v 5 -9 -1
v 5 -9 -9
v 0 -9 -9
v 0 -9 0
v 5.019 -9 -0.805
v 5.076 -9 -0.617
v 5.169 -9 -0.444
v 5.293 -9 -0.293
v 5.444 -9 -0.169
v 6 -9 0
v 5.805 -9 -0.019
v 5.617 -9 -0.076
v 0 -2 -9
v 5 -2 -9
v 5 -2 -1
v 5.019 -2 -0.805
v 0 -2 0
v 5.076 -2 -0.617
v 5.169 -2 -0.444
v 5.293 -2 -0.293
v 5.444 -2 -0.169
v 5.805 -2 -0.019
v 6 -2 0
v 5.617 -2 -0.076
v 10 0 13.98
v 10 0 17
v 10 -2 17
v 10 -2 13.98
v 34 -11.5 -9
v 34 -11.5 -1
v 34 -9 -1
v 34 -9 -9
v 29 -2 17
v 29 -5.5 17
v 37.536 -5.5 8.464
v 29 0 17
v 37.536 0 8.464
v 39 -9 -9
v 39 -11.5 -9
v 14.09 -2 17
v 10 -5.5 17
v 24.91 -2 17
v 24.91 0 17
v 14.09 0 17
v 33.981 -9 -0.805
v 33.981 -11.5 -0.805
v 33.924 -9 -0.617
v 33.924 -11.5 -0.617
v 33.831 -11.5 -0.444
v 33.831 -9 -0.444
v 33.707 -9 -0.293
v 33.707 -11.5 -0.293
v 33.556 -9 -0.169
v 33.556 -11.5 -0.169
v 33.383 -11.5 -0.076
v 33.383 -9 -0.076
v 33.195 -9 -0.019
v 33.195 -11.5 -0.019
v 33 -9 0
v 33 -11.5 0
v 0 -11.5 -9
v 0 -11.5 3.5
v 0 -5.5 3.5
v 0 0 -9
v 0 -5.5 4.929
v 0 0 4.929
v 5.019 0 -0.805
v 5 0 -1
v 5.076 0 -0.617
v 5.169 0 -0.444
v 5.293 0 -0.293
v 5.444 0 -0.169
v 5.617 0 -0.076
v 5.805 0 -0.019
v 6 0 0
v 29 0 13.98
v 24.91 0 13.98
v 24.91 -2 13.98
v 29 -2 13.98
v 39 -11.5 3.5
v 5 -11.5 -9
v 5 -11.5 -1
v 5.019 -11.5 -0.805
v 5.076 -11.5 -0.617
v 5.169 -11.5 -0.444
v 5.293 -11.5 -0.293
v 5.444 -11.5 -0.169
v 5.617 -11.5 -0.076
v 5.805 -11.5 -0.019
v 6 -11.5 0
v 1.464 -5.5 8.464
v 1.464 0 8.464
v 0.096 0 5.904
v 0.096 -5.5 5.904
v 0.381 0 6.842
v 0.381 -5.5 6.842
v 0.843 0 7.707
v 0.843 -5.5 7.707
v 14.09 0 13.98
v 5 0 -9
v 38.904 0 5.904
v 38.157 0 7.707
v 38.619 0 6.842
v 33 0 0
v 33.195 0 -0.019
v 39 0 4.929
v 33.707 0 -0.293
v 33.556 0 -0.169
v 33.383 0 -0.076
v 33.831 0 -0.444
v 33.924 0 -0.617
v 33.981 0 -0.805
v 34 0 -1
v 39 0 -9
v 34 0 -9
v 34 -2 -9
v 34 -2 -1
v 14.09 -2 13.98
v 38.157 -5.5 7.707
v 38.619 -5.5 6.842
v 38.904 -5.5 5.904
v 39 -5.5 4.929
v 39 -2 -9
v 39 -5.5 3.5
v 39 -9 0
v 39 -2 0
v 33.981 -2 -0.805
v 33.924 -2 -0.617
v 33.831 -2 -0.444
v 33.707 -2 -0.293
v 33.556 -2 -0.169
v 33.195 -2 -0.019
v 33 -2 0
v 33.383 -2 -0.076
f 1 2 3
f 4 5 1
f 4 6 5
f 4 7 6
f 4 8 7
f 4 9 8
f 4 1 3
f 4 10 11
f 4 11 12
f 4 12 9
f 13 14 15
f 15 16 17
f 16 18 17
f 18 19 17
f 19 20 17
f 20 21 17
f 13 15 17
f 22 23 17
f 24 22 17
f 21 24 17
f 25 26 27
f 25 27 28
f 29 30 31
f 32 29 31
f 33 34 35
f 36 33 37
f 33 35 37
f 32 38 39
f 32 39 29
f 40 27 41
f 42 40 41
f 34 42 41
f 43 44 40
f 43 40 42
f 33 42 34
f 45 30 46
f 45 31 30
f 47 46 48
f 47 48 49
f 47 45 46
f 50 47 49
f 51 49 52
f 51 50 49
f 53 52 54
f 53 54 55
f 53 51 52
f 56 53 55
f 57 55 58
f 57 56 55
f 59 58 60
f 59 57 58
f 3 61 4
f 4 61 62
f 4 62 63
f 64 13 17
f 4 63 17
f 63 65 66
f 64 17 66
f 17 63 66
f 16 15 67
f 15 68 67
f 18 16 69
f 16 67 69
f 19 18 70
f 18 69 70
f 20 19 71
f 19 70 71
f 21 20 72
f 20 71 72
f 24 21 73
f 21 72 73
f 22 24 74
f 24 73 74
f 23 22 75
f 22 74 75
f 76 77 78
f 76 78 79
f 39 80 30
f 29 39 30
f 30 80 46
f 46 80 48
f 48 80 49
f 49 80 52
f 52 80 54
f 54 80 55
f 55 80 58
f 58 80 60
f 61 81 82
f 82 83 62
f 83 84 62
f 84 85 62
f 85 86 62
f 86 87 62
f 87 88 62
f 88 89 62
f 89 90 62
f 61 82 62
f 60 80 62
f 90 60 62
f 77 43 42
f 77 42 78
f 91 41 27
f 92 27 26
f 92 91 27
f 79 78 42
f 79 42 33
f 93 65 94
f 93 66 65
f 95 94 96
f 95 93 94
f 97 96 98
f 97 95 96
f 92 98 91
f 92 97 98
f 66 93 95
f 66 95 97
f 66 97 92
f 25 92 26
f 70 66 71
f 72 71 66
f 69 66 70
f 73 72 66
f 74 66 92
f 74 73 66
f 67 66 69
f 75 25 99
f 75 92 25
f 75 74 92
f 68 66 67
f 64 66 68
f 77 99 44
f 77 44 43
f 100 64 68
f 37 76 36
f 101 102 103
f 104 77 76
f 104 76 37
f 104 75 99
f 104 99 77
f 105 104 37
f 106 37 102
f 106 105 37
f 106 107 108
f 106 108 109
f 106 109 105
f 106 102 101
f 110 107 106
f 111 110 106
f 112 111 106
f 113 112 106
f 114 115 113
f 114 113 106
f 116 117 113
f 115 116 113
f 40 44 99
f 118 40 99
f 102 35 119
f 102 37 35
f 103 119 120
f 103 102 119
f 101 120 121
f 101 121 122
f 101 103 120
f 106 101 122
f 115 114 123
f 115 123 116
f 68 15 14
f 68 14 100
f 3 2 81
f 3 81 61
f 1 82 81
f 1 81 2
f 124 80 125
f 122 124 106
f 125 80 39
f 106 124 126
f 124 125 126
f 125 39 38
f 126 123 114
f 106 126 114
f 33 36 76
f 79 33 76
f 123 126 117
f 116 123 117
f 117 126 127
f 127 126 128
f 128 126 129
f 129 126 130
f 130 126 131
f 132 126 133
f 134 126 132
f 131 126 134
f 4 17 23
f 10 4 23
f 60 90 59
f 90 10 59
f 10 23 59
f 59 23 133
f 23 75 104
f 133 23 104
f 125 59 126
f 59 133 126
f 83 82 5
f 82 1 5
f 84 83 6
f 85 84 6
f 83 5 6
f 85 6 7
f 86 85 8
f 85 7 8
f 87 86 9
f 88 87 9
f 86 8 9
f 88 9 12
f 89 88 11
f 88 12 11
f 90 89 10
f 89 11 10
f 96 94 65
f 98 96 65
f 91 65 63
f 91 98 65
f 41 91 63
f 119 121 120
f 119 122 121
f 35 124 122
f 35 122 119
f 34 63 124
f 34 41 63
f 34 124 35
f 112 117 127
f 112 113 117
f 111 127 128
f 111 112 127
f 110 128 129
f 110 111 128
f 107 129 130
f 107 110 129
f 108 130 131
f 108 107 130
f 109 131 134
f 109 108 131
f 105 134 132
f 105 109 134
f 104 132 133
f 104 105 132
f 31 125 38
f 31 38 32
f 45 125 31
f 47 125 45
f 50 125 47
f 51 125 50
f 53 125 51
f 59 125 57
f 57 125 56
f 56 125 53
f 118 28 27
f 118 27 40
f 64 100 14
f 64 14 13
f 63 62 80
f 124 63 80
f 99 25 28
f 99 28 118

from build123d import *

# Parameters (mm, degrees)
SKETCH1_W           = 39
SKETCH1_H           = 11.5
BOSS_EXTRUDE1_DEPTH = 17
SKETCH2_W           = 5
SKETCH2_H           = 2.5
SKETCH2_H_2         = 2
BOSS_EXTRUDE2_DEPTH = 9
FILLET3_R           = 1
FILLET4_R           = 1
FILLET5_R           = 1
FILLET6_R           = 1
CHAMFER1_SIZE       = 10
CHAMFER2_SIZE       = 10
SKETCH4_W           = 4.09
SKETCH4_H           = 3.02
CUT_EXTRUDE1_DEPTH  = 2
SKETCH5_W           = 45.21307777
SKETCH5_H           = 21.662699148
CUT_EXTRUDE2_DEPTH  = 6
FILLET7_R           = 5
FILLET8_R           = 5


with BuildPart() as part:
    # Sketch1 → Boss-Extrude1 (new body)
    with BuildSketch(Plane.XY):
        with Locations((19.5, -5.75)):
            Rectangle(SKETCH1_W, SKETCH1_H)
    extrude(amount=BOSS_EXTRUDE1_DEPTH)

    # Sketch2 → Boss-Extrude2 (add)
    with BuildSketch(Plane(origin=(0, 0, 0), x_dir=(-1, 0, 0), z_dir=(0, 0, -1))):
        with Locations((-2.5, -10.25)):
            Rectangle(SKETCH2_W, SKETCH2_H)
        with Locations((-2.5, -1)):
            Rectangle(SKETCH2_W, SKETCH2_H_2)
        with Locations((-36.5, -10.25)):
            Rectangle(SKETCH2_W, SKETCH2_H)
        with Locations((-36.5, -1)):
            Rectangle(SKETCH2_W, SKETCH2_H_2)
    extrude(amount=BOSS_EXTRUDE2_DEPTH)

    # Fillet3
    fillet3_edges = [part.edges().sort_by_distance(p)[0] for p in [
        (34, -1, 0),
    ]]
    fillet(fillet3_edges, radius=FILLET3_R)

    # Fillet4
    fillet4_edges = [part.edges().sort_by_distance(p)[0] for p in [
        (5, -1, 0),
    ]]
    fillet(fillet4_edges, radius=FILLET4_R)

    # Fillet5
    fillet5_edges = [part.edges().sort_by_distance(p)[0] for p in [
        (34, -10.25, 0),
    ]]
    fillet(fillet5_edges, radius=FILLET5_R)

    # Fillet6
    fillet6_edges = [part.edges().sort_by_distance(p)[0] for p in [
        (5, -10.25, 0),
    ]]
    fillet(fillet6_edges, radius=FILLET6_R)

    # Chamfer1
    chamfer1_edges = [part.edges().sort_by_distance(p)[0] for p in [
        (39, -5.75, 17),
    ]]
    chamfer(chamfer1_edges, length=CHAMFER1_SIZE)

    # Chamfer2
    chamfer2_edges = [part.edges().sort_by_distance(p)[0] for p in [
        (0, -5.75, 17),
    ]]
    chamfer(chamfer2_edges, length=CHAMFER2_SIZE)

    # Sketch4 → Cut-Extrude1 (cut)
    with BuildSketch(Plane(origin=(0, 0, 0), x_dir=(1, 0, 0), z_dir=(0, 1, 0))):
        with Locations((26.955, -15.49)):
            Rectangle(SKETCH4_W, SKETCH4_H)
        with Locations((12.045, -15.49)):
            Rectangle(SKETCH4_W, SKETCH4_H)
    extrude(amount=-CUT_EXTRUDE1_DEPTH, mode=Mode.SUBTRACT)

    # Sketch5 → Cut-Extrude2 (cut)
    with BuildSketch(Plane.XZ.offset(11.5)):
        with Locations((22.606538885, 14.331349574)):
            Rectangle(SKETCH5_W, SKETCH5_H)
    extrude(amount=-CUT_EXTRUDE2_DEPTH, mode=Mode.SUBTRACT)

    # Fillet7
    fillet7_edges = [part.edges().sort_by_distance(p)[0] for p in [
        (0, -2.75, 7),
    ]]
    fillet(fillet7_edges, radius=FILLET7_R)

    # Fillet8
    fillet8_edges = [part.edges().sort_by_distance(p)[0] for p in [
        (39, -2.75, 7),
    ]]
    fillet(fillet8_edges, radius=FILLET8_R)


solid = part.part
